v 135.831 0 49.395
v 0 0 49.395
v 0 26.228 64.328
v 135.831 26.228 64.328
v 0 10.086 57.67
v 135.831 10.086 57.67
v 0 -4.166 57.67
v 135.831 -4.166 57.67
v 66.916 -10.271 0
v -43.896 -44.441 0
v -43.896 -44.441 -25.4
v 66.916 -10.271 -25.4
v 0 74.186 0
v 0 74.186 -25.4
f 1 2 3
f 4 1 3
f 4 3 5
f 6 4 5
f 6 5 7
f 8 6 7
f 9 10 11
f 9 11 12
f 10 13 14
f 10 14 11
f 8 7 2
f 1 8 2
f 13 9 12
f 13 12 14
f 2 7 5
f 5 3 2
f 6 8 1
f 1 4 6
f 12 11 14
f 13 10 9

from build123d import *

# Parameters (mm, degrees)
F1_DEPTH = 25.4
F3_DEPTH = 135.830835


with BuildPart() as f1:
    # F0 (on Top) → F1 (new body)
    with BuildSketch(Plane.XY):
        Polygon((66.91578, -10.271098), (0, 74.186161), (-43.896168, -44.440858), align=None)
    extrude(amount=-F1_DEPTH)


with BuildPart() as f3:
    # F2 (on Right) → F3 (new body)
    with BuildSketch(Plane.YZ):
        Polygon((0, 49.394526), (26.227757, 64.327851), (10.086454, 57.669543), (-4.166014, 57.669543), align=None)
    extrude(amount=F3_DEPTH)


solid = Compound([f1.part, f3.part])
